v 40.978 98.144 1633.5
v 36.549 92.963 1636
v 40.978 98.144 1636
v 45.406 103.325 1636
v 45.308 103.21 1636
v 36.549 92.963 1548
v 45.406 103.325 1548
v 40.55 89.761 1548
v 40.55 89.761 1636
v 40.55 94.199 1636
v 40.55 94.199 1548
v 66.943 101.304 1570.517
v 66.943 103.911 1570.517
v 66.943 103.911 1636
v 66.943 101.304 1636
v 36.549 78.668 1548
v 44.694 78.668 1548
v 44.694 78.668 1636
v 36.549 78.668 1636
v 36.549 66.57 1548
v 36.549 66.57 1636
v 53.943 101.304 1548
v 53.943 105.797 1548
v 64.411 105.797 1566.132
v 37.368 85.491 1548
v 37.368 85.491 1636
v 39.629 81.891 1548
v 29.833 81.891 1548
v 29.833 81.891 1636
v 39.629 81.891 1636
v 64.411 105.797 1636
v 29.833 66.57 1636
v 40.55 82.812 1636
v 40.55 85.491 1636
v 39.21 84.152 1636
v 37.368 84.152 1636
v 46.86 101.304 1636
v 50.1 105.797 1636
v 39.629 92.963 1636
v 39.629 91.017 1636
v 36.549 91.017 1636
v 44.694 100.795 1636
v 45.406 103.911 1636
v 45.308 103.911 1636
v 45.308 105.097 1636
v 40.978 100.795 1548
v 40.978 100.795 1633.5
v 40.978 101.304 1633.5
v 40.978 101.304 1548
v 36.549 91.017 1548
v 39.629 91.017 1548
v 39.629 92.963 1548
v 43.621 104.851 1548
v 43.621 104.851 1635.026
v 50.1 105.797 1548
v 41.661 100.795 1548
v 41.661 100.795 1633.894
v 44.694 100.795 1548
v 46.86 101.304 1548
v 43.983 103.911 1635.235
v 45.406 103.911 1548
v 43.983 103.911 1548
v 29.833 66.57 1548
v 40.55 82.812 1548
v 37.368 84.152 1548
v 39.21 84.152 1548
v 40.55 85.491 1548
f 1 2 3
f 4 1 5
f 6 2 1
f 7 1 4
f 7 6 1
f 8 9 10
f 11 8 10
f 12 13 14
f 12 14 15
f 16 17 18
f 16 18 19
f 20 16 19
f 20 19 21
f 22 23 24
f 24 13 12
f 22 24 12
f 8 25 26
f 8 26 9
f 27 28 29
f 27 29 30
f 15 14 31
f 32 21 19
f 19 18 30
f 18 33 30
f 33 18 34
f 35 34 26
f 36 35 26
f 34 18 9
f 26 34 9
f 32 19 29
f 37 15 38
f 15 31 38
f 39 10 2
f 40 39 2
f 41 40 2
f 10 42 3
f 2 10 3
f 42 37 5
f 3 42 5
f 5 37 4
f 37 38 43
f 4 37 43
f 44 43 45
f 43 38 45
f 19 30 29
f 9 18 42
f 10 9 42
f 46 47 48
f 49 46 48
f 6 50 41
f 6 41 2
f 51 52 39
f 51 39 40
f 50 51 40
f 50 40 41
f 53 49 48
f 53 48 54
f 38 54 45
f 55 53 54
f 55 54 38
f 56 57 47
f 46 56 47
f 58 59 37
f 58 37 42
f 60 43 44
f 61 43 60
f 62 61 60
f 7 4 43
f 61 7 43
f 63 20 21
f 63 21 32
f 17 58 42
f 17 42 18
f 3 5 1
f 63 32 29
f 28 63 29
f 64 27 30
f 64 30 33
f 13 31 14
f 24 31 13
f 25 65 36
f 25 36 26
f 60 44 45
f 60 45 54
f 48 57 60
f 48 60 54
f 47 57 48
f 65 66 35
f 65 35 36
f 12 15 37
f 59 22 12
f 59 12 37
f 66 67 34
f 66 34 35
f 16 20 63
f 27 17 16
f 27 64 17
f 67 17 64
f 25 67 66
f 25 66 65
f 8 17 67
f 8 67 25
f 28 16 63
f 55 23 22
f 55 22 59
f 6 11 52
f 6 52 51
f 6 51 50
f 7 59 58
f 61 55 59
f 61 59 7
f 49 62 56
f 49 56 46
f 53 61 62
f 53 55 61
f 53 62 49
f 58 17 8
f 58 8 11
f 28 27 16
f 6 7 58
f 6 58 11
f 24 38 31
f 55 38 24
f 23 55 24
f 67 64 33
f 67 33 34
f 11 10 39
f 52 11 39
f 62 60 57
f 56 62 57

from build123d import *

# Parameters (mm, degrees)
EXTRUDE_1_DEPTH  = 88
CHAMFER_1_SIZE   = 13
CHAMFER_1_SIZE2  = 22.516660498
CHAMFER_2_SIZE   = 4.330127019
CHAMFER_2_SIZE_2 = 2.5


with BuildPart() as part:
    # Эскиз1 → Бобышка-Вытянуть1 (new body)
    with BuildSketch(Plane.XY.offset(1548)):
        Polygon((36.549287829, 66.569518917), (29.833037542, 66.569518917), (29.833037542, 81.891176087), (39.628851143, 81.891176087), (40.549825071, 82.812150015), (40.549825071, 85.491346897), (39.21022663, 84.151748456), (37.368278773, 84.151748456), (37.368278773, 85.491346897), (40.549825071, 89.761316928), (40.549825071, 94.198736764), (39.628851143, 92.962692808), (39.628851143, 91.017190466), (36.549287829, 91.017190466), (36.549287829, 92.962692808), (45.40586942, 103.324751144), (45.40586942, 103.910825462), (43.982546076, 103.910825462), (41.660685836, 100.794644613), (40.977578624, 100.794644613), (40.977578624, 101.303626458), (43.620510787, 104.850719623), (50.100205342, 105.797191861), (64.411422303, 105.797191861), (66.943124576, 103.910825462), (66.943124576, 101.303626458), (46.860358064, 101.303626458), (44.694207748, 100.794644613), (44.694207748, 78.667767338), (36.549287829, 78.667767338), align=None)
    extrude(amount=EXTRUDE_1_DEPTH)

    # Фаска1
    chamfer_1_edges = [part.edges().sort_by_distance(p)[0] for p in [
        (66.943124576, 102.60722596, 1548),
    ]]
    chamfer_1_side = [part.faces().sort_by_distance(p)[0] for p in [
        (43.066294454, 88.644441119, 1548),
    ]]
    chamfer(chamfer_1_edges, length=CHAMFER_1_SIZE, length2=CHAMFER_1_SIZE2, reference=chamfer_1_side[0])

    # Фаска2
    # the kernel refuses this chamfer: 4.330127019, 2.5 mm, written as the material it takes off along each edge
    with BuildSketch(Plane(origin=(40.977578624, 89.592234687, 1636), x_dir=(0.9998132206222081, 0, 0.01932676561269257), z_dir=(0, 1, 0))) as chamfer_2_piece_1_section:
        Polygon((CHAMFER_2_SIZE * 0.999813220604, CHAMFER_2_SIZE * 0.0193267656123), (-CHAMFER_2_SIZE_2 * 0.0193267656127, CHAMFER_2_SIZE_2 * 0.999813220622), (0, 0), align=None)
    chamfer_2_piece_1 = extrude(amount=22.913801697, mode=Mode.PRIVATE)
    chamfer_2_piece_1 = split(chamfer_2_piece_1, bisect_by=Plane(origin=(45.427089539, 103.349578342, 1635.744871049), z_dir=(-0.7601686994393885, 0.6497257485990753, 0)), keep=Keep.TOP, mode=Mode.PRIVATE)
    add(chamfer_2_piece_1, mode=Mode.SUBTRACT)


solid = part.part
